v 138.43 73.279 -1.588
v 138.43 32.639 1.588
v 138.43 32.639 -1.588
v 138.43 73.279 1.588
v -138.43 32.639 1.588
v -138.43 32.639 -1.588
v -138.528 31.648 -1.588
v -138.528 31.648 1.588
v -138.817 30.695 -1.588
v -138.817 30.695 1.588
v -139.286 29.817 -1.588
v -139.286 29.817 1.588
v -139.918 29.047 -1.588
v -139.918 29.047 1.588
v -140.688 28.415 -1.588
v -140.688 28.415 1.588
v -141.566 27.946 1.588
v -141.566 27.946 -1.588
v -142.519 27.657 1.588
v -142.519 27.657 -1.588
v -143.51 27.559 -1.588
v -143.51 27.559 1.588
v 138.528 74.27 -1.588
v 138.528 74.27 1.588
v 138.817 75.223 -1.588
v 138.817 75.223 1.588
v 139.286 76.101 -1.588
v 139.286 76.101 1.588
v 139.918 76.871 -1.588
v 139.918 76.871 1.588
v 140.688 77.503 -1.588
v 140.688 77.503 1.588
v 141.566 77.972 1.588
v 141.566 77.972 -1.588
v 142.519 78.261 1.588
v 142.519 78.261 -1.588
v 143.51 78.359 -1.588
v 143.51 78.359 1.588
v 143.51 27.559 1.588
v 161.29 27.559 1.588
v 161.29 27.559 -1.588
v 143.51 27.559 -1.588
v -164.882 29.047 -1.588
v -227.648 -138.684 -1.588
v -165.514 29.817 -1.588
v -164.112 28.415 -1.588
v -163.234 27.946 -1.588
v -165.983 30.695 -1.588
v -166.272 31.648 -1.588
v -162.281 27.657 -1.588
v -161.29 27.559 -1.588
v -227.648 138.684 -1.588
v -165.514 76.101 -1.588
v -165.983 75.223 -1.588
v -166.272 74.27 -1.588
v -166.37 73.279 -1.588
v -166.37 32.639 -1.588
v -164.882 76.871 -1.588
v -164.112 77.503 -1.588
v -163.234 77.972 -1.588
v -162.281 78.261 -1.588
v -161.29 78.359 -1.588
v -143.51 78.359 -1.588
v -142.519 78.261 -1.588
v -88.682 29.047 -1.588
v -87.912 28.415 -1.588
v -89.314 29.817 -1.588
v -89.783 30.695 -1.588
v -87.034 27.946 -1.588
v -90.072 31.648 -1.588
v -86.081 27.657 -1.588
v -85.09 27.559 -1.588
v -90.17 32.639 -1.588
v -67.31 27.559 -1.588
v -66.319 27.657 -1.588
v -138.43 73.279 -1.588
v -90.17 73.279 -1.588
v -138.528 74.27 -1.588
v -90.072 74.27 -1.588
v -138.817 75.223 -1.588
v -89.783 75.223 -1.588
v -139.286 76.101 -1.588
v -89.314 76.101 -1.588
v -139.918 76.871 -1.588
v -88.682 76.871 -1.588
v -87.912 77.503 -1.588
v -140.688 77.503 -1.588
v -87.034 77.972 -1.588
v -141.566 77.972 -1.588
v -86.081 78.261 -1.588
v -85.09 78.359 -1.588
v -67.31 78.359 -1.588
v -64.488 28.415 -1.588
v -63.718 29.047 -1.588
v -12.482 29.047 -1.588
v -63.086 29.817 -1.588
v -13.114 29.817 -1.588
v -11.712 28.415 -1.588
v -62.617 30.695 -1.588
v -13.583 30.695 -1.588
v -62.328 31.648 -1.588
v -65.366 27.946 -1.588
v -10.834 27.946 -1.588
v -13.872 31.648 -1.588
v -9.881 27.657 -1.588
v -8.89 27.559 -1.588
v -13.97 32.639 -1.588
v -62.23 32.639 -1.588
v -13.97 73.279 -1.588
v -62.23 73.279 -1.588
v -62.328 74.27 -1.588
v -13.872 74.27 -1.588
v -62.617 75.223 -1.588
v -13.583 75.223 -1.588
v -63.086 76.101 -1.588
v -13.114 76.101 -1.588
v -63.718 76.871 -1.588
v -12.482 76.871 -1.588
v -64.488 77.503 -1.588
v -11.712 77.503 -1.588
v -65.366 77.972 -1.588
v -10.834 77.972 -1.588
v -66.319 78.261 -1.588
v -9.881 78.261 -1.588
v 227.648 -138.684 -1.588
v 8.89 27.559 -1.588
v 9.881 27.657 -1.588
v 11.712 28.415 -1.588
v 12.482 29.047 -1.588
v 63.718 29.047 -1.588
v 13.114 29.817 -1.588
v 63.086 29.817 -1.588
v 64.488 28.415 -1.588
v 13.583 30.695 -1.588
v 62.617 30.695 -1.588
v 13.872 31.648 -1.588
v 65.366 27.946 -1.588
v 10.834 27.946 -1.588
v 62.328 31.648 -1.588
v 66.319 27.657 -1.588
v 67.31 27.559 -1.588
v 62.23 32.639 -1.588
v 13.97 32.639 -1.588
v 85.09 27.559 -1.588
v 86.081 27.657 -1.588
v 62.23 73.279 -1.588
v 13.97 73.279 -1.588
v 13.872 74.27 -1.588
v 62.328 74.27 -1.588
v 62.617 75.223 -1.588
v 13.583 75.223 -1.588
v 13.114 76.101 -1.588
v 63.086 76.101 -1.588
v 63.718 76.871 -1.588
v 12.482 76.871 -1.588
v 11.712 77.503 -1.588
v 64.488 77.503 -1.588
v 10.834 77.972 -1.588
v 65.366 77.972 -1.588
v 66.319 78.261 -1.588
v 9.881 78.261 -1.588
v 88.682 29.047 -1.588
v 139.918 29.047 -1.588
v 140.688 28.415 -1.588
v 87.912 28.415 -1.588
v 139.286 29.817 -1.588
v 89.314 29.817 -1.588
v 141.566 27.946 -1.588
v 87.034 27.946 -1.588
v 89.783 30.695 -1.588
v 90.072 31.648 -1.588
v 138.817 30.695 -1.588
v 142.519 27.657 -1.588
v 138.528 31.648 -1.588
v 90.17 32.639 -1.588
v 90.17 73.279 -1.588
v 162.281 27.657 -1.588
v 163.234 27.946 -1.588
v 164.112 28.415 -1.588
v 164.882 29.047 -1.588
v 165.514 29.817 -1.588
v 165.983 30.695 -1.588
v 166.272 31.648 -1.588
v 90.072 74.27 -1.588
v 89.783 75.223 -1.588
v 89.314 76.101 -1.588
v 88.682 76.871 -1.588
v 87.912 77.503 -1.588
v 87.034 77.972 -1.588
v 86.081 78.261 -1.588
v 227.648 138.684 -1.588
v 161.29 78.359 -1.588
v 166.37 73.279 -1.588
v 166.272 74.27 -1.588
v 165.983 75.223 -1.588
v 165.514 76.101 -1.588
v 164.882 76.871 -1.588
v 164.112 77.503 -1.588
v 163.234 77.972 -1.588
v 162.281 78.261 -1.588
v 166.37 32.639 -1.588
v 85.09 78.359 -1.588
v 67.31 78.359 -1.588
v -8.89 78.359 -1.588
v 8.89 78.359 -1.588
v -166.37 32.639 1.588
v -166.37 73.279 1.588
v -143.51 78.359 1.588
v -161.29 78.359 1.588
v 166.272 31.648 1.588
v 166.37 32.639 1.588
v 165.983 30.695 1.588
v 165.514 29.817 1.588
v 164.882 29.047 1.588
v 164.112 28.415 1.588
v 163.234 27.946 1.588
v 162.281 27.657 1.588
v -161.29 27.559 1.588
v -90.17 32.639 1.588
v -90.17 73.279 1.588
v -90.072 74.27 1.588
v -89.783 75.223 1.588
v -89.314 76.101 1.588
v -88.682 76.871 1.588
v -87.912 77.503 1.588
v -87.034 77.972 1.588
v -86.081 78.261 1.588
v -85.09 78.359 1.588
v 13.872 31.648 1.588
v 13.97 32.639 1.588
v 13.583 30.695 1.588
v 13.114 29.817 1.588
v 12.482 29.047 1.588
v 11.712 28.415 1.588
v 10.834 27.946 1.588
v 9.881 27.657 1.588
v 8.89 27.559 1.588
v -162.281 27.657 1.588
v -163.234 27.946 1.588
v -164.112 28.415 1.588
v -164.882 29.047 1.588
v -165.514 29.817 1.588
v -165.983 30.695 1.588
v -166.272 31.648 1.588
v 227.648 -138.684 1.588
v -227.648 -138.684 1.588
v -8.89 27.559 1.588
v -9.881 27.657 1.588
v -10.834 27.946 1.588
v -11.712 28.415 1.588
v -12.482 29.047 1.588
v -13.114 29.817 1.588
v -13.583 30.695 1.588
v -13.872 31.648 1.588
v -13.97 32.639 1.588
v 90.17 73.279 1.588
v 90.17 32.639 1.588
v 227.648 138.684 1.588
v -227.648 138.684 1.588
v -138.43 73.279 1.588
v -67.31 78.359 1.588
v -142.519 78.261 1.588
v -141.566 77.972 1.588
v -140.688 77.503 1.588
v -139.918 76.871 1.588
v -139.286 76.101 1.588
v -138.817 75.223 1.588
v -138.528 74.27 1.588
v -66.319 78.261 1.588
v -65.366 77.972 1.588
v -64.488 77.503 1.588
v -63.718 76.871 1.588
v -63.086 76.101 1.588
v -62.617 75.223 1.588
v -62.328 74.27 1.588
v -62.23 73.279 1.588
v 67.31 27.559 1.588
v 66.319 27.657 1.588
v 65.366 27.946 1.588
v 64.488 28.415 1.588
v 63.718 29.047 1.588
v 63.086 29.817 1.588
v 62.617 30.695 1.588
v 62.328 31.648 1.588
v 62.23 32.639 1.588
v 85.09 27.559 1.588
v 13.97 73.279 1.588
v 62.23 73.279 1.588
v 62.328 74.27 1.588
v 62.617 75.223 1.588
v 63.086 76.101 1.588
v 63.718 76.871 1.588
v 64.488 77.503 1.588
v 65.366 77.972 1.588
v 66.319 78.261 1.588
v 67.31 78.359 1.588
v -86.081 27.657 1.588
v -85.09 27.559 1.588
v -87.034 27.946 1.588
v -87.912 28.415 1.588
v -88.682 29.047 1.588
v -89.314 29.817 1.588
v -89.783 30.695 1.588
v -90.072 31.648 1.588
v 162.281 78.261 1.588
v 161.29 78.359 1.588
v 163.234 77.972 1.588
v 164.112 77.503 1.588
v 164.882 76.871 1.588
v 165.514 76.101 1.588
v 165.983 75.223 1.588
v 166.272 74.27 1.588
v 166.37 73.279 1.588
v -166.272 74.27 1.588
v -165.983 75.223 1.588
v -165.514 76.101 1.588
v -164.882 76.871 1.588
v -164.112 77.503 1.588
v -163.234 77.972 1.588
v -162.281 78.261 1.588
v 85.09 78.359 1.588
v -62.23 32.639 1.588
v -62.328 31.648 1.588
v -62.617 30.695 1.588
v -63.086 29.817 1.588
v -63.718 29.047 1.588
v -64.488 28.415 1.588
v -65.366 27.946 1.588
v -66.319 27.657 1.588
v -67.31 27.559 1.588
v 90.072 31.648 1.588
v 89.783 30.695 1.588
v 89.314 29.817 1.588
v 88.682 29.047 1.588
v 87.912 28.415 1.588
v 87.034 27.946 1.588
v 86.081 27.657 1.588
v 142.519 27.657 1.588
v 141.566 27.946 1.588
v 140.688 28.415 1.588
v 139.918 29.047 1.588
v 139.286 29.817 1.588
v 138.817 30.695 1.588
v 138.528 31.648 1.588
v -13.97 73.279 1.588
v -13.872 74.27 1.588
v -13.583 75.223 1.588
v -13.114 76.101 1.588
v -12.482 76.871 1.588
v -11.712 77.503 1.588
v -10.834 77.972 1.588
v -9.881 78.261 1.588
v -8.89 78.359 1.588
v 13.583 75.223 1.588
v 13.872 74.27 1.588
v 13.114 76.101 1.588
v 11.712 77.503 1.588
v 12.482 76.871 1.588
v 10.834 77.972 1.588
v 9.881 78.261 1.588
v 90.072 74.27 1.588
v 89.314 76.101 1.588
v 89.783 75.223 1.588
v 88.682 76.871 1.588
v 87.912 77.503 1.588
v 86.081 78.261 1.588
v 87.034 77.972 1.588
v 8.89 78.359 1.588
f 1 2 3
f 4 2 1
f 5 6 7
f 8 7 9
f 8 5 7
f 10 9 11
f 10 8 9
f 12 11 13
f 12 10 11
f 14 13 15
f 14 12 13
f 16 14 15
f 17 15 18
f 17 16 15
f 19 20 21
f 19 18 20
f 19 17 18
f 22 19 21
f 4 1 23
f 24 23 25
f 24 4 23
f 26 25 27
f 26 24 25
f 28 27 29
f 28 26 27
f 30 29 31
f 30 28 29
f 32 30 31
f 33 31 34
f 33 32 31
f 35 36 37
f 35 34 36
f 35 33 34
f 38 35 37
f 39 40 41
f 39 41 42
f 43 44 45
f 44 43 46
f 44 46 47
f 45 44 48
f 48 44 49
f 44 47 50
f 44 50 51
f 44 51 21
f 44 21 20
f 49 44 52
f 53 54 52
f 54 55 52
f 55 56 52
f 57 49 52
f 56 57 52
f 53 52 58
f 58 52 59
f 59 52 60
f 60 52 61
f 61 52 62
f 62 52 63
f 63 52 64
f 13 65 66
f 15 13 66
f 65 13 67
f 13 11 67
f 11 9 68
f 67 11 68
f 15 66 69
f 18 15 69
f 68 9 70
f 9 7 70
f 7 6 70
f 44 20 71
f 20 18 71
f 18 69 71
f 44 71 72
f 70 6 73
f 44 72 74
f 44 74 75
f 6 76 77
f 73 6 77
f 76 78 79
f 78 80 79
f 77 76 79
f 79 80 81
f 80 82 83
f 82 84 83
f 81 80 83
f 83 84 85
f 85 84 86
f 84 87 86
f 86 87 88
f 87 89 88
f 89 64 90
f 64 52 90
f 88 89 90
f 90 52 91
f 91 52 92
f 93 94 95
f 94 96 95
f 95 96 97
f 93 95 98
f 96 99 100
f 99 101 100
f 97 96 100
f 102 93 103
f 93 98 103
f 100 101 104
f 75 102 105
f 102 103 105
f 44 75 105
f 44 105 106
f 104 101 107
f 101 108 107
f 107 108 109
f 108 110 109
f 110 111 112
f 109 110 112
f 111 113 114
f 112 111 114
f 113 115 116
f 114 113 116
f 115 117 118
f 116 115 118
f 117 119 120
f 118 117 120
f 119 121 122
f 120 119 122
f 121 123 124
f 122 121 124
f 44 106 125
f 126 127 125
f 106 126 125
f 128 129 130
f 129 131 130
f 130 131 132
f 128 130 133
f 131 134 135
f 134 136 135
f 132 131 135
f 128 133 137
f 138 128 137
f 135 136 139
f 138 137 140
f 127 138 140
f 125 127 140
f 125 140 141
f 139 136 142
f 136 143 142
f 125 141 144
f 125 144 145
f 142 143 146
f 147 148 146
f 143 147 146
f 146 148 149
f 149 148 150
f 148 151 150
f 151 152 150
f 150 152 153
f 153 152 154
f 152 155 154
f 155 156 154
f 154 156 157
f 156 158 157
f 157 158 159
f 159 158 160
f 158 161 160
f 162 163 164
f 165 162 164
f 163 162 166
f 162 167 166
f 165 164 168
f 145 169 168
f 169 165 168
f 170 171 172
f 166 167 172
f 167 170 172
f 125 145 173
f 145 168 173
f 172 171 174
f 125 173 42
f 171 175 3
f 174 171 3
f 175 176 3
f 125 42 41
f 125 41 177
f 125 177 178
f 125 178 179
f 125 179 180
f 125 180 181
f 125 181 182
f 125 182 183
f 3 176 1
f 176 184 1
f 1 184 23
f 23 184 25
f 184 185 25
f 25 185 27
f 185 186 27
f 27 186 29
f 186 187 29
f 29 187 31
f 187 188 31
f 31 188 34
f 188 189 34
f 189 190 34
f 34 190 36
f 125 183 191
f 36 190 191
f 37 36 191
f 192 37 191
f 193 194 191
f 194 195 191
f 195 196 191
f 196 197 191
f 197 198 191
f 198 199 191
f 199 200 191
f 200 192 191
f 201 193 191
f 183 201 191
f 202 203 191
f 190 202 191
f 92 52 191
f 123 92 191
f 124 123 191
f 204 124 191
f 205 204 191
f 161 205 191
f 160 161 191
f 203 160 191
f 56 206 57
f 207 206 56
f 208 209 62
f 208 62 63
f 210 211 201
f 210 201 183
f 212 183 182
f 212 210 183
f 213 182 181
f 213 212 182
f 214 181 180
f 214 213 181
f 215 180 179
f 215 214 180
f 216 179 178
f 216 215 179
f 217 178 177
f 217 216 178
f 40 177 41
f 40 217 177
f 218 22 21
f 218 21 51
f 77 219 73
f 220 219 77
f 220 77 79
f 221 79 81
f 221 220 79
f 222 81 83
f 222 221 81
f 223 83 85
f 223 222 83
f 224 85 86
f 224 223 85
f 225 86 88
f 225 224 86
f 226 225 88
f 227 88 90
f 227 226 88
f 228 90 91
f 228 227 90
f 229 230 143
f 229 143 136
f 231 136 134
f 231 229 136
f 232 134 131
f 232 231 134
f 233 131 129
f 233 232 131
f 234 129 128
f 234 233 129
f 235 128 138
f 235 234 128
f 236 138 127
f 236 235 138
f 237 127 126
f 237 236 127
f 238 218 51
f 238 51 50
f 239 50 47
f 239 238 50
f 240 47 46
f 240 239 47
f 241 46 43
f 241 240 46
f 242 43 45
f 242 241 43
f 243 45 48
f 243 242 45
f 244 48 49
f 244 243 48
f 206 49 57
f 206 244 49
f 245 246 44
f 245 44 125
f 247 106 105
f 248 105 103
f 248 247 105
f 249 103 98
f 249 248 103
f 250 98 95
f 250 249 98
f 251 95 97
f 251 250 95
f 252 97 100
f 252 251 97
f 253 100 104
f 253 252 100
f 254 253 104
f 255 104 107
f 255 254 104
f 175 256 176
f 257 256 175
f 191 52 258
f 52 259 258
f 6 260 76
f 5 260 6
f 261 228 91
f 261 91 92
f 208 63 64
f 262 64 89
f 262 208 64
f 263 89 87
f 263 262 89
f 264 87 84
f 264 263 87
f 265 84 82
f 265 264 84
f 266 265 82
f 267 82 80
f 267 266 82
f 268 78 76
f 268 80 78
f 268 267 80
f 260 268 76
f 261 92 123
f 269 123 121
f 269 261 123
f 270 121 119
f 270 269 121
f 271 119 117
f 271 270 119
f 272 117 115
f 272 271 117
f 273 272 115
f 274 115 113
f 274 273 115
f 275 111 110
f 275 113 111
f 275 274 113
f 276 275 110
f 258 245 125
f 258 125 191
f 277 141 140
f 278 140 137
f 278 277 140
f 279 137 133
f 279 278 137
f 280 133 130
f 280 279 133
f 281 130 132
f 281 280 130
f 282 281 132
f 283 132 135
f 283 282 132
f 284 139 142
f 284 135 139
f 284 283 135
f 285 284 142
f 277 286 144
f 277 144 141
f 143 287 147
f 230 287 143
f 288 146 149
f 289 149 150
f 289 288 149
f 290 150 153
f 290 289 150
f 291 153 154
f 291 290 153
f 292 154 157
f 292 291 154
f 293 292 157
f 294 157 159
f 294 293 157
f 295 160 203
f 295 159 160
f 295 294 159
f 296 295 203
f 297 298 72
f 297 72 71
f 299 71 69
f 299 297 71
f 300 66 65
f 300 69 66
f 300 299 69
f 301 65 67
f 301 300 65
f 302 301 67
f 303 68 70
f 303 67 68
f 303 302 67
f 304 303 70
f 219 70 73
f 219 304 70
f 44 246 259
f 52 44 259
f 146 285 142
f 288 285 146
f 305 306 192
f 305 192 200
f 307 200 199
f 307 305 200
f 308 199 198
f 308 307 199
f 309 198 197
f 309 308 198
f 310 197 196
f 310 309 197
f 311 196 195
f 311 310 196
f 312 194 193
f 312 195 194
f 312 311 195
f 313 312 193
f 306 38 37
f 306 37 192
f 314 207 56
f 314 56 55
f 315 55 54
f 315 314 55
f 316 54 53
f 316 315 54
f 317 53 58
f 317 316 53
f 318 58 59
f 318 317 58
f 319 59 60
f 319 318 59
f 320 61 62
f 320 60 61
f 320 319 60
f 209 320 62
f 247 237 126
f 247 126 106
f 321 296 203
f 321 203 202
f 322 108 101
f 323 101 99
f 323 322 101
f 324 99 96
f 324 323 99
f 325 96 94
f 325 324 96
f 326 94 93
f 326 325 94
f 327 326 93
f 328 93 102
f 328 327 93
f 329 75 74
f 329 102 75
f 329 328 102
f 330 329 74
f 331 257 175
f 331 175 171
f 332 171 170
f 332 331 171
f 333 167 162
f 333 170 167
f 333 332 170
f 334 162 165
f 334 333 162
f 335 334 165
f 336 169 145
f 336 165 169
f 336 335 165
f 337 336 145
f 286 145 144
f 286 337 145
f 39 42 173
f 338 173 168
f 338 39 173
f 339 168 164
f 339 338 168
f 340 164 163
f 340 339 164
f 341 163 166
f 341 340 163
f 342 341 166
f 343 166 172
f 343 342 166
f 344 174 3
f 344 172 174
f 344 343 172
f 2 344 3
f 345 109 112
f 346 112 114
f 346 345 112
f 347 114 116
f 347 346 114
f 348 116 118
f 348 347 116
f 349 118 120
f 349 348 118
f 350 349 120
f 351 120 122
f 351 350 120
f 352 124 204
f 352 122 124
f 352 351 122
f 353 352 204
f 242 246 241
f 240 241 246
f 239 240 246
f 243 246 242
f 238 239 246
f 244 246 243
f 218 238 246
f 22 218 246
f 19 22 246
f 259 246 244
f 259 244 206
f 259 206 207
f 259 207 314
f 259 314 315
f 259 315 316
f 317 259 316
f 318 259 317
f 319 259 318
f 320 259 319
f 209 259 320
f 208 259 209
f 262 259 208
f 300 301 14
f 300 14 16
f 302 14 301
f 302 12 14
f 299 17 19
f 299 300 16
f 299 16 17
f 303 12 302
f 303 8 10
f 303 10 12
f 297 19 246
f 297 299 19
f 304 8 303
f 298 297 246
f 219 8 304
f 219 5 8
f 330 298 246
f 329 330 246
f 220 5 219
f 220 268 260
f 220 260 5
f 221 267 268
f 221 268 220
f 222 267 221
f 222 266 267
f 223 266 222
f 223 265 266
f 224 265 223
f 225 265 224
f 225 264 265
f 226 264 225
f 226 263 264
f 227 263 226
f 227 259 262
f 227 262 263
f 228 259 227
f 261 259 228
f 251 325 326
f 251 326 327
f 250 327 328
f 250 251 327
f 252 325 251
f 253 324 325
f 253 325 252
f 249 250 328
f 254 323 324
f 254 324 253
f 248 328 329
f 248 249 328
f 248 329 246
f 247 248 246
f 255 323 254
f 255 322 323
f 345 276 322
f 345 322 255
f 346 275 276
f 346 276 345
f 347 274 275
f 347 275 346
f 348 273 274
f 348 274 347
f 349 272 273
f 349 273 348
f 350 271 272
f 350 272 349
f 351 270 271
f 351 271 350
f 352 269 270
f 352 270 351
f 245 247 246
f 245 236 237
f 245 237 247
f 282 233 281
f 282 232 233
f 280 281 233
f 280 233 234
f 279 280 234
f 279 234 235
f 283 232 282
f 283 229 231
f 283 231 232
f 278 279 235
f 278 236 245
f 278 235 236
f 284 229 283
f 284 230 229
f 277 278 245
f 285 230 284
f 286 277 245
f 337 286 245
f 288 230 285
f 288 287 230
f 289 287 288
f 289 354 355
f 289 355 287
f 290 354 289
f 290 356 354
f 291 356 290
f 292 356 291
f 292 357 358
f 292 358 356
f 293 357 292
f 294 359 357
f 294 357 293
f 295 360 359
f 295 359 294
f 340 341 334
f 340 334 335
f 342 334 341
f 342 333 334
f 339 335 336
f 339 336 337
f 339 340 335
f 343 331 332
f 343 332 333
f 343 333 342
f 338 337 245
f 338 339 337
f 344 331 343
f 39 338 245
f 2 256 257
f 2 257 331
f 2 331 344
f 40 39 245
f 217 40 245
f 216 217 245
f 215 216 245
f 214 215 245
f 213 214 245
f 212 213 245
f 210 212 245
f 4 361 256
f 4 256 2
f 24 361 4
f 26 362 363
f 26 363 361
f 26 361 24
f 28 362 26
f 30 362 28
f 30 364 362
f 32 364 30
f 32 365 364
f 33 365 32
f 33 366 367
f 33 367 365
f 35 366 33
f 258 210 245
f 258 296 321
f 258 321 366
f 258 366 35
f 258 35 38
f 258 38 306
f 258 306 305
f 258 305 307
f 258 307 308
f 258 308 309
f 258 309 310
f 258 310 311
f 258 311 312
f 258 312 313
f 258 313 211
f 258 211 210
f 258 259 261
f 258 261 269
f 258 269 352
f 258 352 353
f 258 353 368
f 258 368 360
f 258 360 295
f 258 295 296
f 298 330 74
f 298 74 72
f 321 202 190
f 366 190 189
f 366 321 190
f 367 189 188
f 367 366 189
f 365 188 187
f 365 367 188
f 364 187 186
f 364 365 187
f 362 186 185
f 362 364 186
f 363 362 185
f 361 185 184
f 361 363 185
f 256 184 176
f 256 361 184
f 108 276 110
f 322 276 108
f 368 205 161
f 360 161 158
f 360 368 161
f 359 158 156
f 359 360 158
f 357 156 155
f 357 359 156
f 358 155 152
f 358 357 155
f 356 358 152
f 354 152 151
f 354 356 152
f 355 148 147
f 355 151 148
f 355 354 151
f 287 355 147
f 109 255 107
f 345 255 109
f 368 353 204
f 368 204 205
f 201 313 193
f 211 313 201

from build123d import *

# Parameters (mm, degrees)
SKETCH3_W           = 455.295
SKETCH3_H           = 277.368
BOSS_EXTRUDE1_DEPTH = 1.5875
CUT_EXTRUDE1_DEPTH  = 25.4


with BuildPart() as part:
    # Sketch3 → Boss-Extrude1 (new, symmetric)
    with BuildSketch(Plane.XY):
        Rectangle(SKETCH3_W, SKETCH3_H)
    extrude(amount=BOSS_EXTRUDE1_DEPTH, both=True)

    # Sketch4 → Cut-Extrude1 (cut)
    with BuildSketch(Plane.XY.offset(1.5875)):
        with BuildLine():
            Line((-161.29, 78.359001016), (-143.51, 78.359001016))
            ThreePointArc((-143.51, 78.359001016), (-139.917897552, 76.871103464), (-138.43, 73.279001016))
            Line((-138.43, 73.279001016), (-138.43, 32.639001016))
            ThreePointArc((-138.43, 32.639001016), (-139.917897552, 29.046898568), (-143.51, 27.559001016))
            Line((-143.51, 27.559001016), (-161.29, 27.559001016))
            ThreePointArc((-161.29, 27.559001016), (-164.882102448, 29.046898568), (-166.37, 32.639001016))
            Line((-166.37, 32.639001016), (-166.37, 73.279001016))
            ThreePointArc((-166.37, 73.279001016), (-164.882102448, 76.871103464), (-161.29, 78.359001016))
        make_face()
        with BuildLine():
            Line((-8.89, 78.359001016), (8.89, 78.359001016))
            ThreePointArc((8.89, 78.359001016), (12.482102448, 76.871103464), (13.97, 73.279001016))
            Line((13.97, 73.279001016), (13.97, 32.639001016))
            ThreePointArc((13.97, 32.639001016), (12.482102448, 29.046898568), (8.89, 27.559001016))
            Line((8.89, 27.559001016), (-8.89, 27.559001016))
            ThreePointArc((-8.89, 27.559001016), (-12.482102448, 29.046898568), (-13.97, 32.639001016))
            Line((-13.97, 32.639001016), (-13.97, 73.279001016))
            ThreePointArc((-13.97, 73.279001016), (-12.482102448, 76.871103464), (-8.89, 78.359001016))
        make_face()
        with BuildLine():
            Line((67.31, 78.359001016), (85.09, 78.359001016))
            ThreePointArc((85.09, 78.359001016), (88.682102448, 76.871103464), (90.17, 73.279001016))
            Line((90.17, 73.279001016), (90.17, 32.639001016))
            ThreePointArc((90.17, 32.639001016), (88.682102448, 29.046898568), (85.09, 27.559001016))
            Line((85.09, 27.559001016), (67.31, 27.559001016))
            ThreePointArc((67.31, 27.559001016), (63.717897552, 29.046898568), (62.23, 32.639001016))
            Line((62.23, 32.639001016), (62.23, 73.279001016))
            ThreePointArc((62.23, 73.279001016), (63.717897552, 76.871103464), (67.31, 78.359001016))
        make_face()
        with BuildLine():
            Line((143.51, 78.359001016), (161.29, 78.359001016))
            ThreePointArc((161.29, 78.359001016), (164.882102448, 76.871103464), (166.37, 73.279001016))
            Line((166.37, 73.279001016), (166.37, 32.639001016))
            ThreePointArc((166.37, 32.639001016), (164.882102448, 29.046898568), (161.29, 27.559001016))
            Line((161.29, 27.559001016), (143.51, 27.559001016))
            ThreePointArc((143.51, 27.559001016), (139.917897552, 29.046898568), (138.43, 32.639001016))
            Line((138.43, 32.639001016), (138.43, 73.279001016))
            ThreePointArc((138.43, 73.279001016), (139.917897552, 76.871103464), (143.51, 78.359001016))
        make_face()
        with BuildLine():
            Line((-85.09, 78.359001016), (-67.31, 78.359001016))
            ThreePointArc((-67.31, 78.359001016), (-63.717897552, 76.871103464), (-62.23, 73.279001016))
            Line((-62.23, 73.279001016), (-62.23, 32.639001016))
            ThreePointArc((-62.23, 32.639001016), (-63.717897552, 29.046898568), (-67.31, 27.559001016))
            Line((-67.31, 27.559001016), (-85.09, 27.559001016))
            ThreePointArc((-85.09, 27.559001016), (-88.682102448, 29.046898568), (-90.17, 32.639001016))
            Line((-90.17, 32.639001016), (-90.17, 73.279001016))
            ThreePointArc((-90.17, 73.279001016), (-88.682102448, 76.871103464), (-85.09, 78.359001016))
        make_face()
    extrude(amount=-CUT_EXTRUDE1_DEPTH, mode=Mode.SUBTRACT)


solid = part.part
